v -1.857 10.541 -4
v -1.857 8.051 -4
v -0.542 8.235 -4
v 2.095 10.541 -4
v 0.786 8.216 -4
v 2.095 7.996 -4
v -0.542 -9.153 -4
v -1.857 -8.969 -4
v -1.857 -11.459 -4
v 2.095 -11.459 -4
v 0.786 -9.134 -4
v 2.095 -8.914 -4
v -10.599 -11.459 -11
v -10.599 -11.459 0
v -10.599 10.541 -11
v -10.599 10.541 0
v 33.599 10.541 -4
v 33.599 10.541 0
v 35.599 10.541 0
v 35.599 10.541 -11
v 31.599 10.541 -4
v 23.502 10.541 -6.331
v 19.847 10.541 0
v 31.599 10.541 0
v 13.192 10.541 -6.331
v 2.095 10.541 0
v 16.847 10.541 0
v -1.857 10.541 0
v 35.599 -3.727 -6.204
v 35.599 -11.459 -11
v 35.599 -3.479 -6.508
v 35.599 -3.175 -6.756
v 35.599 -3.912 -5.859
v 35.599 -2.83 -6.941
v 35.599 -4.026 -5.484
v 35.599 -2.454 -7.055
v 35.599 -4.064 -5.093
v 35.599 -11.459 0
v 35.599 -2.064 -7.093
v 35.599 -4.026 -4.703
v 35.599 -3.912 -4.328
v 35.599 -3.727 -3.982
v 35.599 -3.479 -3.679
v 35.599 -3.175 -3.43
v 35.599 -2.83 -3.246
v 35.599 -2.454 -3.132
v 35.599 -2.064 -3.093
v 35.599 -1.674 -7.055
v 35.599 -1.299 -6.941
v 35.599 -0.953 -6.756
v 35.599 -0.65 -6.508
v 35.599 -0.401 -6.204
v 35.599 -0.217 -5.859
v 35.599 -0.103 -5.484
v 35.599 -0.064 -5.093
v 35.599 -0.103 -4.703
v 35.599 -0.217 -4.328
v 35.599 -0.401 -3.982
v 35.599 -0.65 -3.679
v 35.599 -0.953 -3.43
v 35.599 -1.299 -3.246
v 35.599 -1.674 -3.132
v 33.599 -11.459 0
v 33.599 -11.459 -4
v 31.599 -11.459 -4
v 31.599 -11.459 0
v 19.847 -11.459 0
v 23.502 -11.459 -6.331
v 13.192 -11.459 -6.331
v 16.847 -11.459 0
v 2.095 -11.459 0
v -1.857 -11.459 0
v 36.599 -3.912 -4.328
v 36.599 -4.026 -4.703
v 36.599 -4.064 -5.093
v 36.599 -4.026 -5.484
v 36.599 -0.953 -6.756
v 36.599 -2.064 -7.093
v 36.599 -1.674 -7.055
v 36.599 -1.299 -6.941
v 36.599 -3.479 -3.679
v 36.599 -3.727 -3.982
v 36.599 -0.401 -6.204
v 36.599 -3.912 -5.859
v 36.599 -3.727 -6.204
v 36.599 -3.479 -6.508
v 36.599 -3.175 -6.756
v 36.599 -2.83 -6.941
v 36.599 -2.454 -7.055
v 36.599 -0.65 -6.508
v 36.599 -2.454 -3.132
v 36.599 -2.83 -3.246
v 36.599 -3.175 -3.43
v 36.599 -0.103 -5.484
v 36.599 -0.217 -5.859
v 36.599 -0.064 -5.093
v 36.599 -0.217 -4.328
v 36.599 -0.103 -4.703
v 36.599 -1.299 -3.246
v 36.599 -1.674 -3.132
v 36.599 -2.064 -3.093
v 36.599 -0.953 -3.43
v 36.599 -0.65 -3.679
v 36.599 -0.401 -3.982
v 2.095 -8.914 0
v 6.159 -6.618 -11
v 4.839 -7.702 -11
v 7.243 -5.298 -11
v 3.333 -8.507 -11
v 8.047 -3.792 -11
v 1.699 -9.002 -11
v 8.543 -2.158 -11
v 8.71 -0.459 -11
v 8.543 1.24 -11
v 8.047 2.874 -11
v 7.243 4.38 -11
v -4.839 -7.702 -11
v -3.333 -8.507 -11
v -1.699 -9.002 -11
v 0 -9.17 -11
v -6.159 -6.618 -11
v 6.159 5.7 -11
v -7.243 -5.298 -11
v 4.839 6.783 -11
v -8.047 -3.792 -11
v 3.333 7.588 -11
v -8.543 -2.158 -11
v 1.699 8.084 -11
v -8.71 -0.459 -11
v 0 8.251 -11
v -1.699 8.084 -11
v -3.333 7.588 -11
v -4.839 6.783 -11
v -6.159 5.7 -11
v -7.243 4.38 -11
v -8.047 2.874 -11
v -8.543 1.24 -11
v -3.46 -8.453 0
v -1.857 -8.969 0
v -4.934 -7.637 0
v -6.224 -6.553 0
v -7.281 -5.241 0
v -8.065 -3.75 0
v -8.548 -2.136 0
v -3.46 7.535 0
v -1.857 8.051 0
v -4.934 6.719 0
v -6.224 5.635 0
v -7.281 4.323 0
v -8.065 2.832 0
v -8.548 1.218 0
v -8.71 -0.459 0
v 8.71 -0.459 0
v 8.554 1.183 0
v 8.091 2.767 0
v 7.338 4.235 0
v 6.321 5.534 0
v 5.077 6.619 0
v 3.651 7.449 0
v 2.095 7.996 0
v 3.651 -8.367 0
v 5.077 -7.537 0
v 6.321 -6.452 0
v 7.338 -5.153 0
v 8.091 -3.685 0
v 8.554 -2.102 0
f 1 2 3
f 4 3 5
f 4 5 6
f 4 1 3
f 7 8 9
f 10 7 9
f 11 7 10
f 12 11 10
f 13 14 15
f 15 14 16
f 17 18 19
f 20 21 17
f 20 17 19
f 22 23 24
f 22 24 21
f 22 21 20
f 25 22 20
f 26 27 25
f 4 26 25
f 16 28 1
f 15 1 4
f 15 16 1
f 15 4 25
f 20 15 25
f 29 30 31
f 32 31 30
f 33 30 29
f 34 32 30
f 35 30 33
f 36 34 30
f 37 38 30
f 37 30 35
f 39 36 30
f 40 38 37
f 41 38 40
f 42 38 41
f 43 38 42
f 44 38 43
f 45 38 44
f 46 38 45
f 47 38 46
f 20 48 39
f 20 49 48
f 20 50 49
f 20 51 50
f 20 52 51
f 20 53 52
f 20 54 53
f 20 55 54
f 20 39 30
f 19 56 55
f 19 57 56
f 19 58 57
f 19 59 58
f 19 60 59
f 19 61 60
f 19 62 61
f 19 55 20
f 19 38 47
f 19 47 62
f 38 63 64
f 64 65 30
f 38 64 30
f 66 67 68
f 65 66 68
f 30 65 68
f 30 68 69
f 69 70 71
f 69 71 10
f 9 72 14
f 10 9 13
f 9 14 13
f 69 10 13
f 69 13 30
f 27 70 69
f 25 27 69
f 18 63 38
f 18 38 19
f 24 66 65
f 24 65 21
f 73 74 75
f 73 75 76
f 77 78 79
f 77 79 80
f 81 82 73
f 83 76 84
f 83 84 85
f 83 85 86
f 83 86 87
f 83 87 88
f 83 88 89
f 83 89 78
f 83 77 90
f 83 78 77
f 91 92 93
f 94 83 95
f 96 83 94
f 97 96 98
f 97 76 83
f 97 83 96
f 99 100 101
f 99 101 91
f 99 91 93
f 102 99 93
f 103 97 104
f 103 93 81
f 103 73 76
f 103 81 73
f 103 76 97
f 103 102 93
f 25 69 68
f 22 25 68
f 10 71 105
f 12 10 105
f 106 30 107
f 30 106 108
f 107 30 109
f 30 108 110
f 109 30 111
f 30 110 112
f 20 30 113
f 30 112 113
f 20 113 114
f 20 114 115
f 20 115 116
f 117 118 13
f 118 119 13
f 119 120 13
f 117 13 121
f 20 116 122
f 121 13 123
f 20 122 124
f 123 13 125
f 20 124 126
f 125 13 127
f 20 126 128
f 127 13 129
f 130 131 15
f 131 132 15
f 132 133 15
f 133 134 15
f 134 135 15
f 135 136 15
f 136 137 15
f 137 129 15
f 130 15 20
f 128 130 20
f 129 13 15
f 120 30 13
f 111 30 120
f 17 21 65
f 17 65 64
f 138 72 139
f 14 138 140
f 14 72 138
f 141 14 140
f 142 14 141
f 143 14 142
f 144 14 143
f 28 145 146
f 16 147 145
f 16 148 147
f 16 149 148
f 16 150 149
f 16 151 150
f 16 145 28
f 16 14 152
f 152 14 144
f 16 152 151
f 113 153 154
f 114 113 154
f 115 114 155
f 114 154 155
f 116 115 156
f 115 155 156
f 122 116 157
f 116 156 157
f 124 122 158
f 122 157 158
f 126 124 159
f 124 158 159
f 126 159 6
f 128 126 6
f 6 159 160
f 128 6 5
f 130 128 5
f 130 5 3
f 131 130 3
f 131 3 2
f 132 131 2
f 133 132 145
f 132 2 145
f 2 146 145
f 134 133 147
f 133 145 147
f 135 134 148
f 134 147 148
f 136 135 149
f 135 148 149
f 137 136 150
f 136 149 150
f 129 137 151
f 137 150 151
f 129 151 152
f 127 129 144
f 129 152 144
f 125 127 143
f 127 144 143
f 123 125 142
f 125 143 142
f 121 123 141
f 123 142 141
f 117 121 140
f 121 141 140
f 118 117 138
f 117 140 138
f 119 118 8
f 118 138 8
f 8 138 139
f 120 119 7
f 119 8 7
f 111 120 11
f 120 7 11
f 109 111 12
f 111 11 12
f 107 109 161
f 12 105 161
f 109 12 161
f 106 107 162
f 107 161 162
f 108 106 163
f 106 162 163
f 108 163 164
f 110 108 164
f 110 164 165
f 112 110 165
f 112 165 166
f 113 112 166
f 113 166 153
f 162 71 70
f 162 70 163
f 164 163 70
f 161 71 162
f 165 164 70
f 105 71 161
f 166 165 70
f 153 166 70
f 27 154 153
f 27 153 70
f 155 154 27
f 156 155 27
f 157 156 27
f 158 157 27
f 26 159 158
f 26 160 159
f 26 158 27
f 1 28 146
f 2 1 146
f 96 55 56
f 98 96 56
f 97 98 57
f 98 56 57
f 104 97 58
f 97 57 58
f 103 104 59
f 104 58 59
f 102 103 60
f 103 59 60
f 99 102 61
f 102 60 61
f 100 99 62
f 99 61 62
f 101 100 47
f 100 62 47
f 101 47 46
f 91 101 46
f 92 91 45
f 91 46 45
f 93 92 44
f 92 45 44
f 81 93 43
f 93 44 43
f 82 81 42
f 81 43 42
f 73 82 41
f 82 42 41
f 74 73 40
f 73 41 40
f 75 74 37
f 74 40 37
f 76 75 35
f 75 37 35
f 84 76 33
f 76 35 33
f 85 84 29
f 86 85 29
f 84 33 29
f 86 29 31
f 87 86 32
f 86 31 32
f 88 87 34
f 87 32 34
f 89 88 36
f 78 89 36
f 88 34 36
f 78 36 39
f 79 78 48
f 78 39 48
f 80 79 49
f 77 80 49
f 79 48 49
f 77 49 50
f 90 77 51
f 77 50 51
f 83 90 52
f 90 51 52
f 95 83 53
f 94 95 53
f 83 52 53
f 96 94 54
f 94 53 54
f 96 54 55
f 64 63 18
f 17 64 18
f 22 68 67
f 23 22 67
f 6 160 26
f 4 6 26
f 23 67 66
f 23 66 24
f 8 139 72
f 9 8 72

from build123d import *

# Parameters (mm, degrees)
F0_W     = 21.1988506515
F0_H     = 22
F0_R     = 8.7104848274
F1_DEPTH = 11
F2_DEPTH = 25
F3_W     = 2
F3_H     = 22
F4_DEPTH = 4
F6_DEPTH = 22.001
F7_R     = 2
F8_DEPTH = 1


with BuildPart() as f1:
    # F0 (on Top) → F1 (new body)
    with BuildSketch(Plane.XY):
        with Locations((0, -0.4590692324)):
            Rectangle(F0_W, F0_H)
        with Locations((0, -0.4590692324)):
            Circle(F0_R, mode=Mode.SUBTRACT)
    extrude(amount=-F1_DEPTH)

    # F2 (add): a face of the model
    f2_faces = [f1.faces().sort_by_distance(p)[0] for p in [
        (10.5994253258, -0.4590692324, -5.5),
    ]]
    extrude(f2_faces, amount=F2_DEPTH)

    # F3 (on face) → F4 (cut)
    with BuildSketch(Plane.XY):
        with Locations((32.5994253258, -0.4590692324)):
            Rectangle(F3_W, F3_H)
        with BuildLine():
            Line((-1.8565698992, -11.4590692324), (2.0946341101, -11.4590692324))
            Line((2.0946341101, -11.4590692324), (2.0946341101, -8.9139526659))
            ThreePointArc((2.0946341101, -8.9139526659), (0.1222177802, -9.168696592), (-1.8565698992, -8.9693979063))
            Line((-1.8565698992, -8.9693979063), (-1.8565698992, -11.4590692324))
        make_face()
        with BuildLine():
            Line((2.0946341101, 7.995814201), (2.0946341101, 10.5409307676))
            Line((2.0946341101, 10.5409307676), (-1.8565698992, 10.5409307676))
            Line((-1.8565698992, 10.5409307676), (-1.8565698992, 8.0512594415))
            ThreePointArc((-1.8565698992, 8.0512594415), (0.1222177802, 8.2505581271), (2.0946341101, 7.995814201))
        make_face()
    extrude(amount=-F4_DEPTH, mode=Mode.SUBTRACT)

    # F5 (on face) → F6 (cut, through all)
    with BuildSketch(Plane.XZ.offset(11.4590692324)):
        Polygon((19.8470297179, 0), (16.8470297179, 0), (13.192070817, -6.330574516), (23.5019886189, -6.330574516), align=None)
    extrude(amount=-F6_DEPTH, mode=Mode.SUBTRACT)

    # F7 (on face) → F8 (join)
    with BuildSketch(Plane.YZ.offset(35.5994253258)):
        with Locations((-2.064286964, -5.0933435559)):
            Circle(F7_R)
    extrude(amount=F8_DEPTH)


solid = f1.part
